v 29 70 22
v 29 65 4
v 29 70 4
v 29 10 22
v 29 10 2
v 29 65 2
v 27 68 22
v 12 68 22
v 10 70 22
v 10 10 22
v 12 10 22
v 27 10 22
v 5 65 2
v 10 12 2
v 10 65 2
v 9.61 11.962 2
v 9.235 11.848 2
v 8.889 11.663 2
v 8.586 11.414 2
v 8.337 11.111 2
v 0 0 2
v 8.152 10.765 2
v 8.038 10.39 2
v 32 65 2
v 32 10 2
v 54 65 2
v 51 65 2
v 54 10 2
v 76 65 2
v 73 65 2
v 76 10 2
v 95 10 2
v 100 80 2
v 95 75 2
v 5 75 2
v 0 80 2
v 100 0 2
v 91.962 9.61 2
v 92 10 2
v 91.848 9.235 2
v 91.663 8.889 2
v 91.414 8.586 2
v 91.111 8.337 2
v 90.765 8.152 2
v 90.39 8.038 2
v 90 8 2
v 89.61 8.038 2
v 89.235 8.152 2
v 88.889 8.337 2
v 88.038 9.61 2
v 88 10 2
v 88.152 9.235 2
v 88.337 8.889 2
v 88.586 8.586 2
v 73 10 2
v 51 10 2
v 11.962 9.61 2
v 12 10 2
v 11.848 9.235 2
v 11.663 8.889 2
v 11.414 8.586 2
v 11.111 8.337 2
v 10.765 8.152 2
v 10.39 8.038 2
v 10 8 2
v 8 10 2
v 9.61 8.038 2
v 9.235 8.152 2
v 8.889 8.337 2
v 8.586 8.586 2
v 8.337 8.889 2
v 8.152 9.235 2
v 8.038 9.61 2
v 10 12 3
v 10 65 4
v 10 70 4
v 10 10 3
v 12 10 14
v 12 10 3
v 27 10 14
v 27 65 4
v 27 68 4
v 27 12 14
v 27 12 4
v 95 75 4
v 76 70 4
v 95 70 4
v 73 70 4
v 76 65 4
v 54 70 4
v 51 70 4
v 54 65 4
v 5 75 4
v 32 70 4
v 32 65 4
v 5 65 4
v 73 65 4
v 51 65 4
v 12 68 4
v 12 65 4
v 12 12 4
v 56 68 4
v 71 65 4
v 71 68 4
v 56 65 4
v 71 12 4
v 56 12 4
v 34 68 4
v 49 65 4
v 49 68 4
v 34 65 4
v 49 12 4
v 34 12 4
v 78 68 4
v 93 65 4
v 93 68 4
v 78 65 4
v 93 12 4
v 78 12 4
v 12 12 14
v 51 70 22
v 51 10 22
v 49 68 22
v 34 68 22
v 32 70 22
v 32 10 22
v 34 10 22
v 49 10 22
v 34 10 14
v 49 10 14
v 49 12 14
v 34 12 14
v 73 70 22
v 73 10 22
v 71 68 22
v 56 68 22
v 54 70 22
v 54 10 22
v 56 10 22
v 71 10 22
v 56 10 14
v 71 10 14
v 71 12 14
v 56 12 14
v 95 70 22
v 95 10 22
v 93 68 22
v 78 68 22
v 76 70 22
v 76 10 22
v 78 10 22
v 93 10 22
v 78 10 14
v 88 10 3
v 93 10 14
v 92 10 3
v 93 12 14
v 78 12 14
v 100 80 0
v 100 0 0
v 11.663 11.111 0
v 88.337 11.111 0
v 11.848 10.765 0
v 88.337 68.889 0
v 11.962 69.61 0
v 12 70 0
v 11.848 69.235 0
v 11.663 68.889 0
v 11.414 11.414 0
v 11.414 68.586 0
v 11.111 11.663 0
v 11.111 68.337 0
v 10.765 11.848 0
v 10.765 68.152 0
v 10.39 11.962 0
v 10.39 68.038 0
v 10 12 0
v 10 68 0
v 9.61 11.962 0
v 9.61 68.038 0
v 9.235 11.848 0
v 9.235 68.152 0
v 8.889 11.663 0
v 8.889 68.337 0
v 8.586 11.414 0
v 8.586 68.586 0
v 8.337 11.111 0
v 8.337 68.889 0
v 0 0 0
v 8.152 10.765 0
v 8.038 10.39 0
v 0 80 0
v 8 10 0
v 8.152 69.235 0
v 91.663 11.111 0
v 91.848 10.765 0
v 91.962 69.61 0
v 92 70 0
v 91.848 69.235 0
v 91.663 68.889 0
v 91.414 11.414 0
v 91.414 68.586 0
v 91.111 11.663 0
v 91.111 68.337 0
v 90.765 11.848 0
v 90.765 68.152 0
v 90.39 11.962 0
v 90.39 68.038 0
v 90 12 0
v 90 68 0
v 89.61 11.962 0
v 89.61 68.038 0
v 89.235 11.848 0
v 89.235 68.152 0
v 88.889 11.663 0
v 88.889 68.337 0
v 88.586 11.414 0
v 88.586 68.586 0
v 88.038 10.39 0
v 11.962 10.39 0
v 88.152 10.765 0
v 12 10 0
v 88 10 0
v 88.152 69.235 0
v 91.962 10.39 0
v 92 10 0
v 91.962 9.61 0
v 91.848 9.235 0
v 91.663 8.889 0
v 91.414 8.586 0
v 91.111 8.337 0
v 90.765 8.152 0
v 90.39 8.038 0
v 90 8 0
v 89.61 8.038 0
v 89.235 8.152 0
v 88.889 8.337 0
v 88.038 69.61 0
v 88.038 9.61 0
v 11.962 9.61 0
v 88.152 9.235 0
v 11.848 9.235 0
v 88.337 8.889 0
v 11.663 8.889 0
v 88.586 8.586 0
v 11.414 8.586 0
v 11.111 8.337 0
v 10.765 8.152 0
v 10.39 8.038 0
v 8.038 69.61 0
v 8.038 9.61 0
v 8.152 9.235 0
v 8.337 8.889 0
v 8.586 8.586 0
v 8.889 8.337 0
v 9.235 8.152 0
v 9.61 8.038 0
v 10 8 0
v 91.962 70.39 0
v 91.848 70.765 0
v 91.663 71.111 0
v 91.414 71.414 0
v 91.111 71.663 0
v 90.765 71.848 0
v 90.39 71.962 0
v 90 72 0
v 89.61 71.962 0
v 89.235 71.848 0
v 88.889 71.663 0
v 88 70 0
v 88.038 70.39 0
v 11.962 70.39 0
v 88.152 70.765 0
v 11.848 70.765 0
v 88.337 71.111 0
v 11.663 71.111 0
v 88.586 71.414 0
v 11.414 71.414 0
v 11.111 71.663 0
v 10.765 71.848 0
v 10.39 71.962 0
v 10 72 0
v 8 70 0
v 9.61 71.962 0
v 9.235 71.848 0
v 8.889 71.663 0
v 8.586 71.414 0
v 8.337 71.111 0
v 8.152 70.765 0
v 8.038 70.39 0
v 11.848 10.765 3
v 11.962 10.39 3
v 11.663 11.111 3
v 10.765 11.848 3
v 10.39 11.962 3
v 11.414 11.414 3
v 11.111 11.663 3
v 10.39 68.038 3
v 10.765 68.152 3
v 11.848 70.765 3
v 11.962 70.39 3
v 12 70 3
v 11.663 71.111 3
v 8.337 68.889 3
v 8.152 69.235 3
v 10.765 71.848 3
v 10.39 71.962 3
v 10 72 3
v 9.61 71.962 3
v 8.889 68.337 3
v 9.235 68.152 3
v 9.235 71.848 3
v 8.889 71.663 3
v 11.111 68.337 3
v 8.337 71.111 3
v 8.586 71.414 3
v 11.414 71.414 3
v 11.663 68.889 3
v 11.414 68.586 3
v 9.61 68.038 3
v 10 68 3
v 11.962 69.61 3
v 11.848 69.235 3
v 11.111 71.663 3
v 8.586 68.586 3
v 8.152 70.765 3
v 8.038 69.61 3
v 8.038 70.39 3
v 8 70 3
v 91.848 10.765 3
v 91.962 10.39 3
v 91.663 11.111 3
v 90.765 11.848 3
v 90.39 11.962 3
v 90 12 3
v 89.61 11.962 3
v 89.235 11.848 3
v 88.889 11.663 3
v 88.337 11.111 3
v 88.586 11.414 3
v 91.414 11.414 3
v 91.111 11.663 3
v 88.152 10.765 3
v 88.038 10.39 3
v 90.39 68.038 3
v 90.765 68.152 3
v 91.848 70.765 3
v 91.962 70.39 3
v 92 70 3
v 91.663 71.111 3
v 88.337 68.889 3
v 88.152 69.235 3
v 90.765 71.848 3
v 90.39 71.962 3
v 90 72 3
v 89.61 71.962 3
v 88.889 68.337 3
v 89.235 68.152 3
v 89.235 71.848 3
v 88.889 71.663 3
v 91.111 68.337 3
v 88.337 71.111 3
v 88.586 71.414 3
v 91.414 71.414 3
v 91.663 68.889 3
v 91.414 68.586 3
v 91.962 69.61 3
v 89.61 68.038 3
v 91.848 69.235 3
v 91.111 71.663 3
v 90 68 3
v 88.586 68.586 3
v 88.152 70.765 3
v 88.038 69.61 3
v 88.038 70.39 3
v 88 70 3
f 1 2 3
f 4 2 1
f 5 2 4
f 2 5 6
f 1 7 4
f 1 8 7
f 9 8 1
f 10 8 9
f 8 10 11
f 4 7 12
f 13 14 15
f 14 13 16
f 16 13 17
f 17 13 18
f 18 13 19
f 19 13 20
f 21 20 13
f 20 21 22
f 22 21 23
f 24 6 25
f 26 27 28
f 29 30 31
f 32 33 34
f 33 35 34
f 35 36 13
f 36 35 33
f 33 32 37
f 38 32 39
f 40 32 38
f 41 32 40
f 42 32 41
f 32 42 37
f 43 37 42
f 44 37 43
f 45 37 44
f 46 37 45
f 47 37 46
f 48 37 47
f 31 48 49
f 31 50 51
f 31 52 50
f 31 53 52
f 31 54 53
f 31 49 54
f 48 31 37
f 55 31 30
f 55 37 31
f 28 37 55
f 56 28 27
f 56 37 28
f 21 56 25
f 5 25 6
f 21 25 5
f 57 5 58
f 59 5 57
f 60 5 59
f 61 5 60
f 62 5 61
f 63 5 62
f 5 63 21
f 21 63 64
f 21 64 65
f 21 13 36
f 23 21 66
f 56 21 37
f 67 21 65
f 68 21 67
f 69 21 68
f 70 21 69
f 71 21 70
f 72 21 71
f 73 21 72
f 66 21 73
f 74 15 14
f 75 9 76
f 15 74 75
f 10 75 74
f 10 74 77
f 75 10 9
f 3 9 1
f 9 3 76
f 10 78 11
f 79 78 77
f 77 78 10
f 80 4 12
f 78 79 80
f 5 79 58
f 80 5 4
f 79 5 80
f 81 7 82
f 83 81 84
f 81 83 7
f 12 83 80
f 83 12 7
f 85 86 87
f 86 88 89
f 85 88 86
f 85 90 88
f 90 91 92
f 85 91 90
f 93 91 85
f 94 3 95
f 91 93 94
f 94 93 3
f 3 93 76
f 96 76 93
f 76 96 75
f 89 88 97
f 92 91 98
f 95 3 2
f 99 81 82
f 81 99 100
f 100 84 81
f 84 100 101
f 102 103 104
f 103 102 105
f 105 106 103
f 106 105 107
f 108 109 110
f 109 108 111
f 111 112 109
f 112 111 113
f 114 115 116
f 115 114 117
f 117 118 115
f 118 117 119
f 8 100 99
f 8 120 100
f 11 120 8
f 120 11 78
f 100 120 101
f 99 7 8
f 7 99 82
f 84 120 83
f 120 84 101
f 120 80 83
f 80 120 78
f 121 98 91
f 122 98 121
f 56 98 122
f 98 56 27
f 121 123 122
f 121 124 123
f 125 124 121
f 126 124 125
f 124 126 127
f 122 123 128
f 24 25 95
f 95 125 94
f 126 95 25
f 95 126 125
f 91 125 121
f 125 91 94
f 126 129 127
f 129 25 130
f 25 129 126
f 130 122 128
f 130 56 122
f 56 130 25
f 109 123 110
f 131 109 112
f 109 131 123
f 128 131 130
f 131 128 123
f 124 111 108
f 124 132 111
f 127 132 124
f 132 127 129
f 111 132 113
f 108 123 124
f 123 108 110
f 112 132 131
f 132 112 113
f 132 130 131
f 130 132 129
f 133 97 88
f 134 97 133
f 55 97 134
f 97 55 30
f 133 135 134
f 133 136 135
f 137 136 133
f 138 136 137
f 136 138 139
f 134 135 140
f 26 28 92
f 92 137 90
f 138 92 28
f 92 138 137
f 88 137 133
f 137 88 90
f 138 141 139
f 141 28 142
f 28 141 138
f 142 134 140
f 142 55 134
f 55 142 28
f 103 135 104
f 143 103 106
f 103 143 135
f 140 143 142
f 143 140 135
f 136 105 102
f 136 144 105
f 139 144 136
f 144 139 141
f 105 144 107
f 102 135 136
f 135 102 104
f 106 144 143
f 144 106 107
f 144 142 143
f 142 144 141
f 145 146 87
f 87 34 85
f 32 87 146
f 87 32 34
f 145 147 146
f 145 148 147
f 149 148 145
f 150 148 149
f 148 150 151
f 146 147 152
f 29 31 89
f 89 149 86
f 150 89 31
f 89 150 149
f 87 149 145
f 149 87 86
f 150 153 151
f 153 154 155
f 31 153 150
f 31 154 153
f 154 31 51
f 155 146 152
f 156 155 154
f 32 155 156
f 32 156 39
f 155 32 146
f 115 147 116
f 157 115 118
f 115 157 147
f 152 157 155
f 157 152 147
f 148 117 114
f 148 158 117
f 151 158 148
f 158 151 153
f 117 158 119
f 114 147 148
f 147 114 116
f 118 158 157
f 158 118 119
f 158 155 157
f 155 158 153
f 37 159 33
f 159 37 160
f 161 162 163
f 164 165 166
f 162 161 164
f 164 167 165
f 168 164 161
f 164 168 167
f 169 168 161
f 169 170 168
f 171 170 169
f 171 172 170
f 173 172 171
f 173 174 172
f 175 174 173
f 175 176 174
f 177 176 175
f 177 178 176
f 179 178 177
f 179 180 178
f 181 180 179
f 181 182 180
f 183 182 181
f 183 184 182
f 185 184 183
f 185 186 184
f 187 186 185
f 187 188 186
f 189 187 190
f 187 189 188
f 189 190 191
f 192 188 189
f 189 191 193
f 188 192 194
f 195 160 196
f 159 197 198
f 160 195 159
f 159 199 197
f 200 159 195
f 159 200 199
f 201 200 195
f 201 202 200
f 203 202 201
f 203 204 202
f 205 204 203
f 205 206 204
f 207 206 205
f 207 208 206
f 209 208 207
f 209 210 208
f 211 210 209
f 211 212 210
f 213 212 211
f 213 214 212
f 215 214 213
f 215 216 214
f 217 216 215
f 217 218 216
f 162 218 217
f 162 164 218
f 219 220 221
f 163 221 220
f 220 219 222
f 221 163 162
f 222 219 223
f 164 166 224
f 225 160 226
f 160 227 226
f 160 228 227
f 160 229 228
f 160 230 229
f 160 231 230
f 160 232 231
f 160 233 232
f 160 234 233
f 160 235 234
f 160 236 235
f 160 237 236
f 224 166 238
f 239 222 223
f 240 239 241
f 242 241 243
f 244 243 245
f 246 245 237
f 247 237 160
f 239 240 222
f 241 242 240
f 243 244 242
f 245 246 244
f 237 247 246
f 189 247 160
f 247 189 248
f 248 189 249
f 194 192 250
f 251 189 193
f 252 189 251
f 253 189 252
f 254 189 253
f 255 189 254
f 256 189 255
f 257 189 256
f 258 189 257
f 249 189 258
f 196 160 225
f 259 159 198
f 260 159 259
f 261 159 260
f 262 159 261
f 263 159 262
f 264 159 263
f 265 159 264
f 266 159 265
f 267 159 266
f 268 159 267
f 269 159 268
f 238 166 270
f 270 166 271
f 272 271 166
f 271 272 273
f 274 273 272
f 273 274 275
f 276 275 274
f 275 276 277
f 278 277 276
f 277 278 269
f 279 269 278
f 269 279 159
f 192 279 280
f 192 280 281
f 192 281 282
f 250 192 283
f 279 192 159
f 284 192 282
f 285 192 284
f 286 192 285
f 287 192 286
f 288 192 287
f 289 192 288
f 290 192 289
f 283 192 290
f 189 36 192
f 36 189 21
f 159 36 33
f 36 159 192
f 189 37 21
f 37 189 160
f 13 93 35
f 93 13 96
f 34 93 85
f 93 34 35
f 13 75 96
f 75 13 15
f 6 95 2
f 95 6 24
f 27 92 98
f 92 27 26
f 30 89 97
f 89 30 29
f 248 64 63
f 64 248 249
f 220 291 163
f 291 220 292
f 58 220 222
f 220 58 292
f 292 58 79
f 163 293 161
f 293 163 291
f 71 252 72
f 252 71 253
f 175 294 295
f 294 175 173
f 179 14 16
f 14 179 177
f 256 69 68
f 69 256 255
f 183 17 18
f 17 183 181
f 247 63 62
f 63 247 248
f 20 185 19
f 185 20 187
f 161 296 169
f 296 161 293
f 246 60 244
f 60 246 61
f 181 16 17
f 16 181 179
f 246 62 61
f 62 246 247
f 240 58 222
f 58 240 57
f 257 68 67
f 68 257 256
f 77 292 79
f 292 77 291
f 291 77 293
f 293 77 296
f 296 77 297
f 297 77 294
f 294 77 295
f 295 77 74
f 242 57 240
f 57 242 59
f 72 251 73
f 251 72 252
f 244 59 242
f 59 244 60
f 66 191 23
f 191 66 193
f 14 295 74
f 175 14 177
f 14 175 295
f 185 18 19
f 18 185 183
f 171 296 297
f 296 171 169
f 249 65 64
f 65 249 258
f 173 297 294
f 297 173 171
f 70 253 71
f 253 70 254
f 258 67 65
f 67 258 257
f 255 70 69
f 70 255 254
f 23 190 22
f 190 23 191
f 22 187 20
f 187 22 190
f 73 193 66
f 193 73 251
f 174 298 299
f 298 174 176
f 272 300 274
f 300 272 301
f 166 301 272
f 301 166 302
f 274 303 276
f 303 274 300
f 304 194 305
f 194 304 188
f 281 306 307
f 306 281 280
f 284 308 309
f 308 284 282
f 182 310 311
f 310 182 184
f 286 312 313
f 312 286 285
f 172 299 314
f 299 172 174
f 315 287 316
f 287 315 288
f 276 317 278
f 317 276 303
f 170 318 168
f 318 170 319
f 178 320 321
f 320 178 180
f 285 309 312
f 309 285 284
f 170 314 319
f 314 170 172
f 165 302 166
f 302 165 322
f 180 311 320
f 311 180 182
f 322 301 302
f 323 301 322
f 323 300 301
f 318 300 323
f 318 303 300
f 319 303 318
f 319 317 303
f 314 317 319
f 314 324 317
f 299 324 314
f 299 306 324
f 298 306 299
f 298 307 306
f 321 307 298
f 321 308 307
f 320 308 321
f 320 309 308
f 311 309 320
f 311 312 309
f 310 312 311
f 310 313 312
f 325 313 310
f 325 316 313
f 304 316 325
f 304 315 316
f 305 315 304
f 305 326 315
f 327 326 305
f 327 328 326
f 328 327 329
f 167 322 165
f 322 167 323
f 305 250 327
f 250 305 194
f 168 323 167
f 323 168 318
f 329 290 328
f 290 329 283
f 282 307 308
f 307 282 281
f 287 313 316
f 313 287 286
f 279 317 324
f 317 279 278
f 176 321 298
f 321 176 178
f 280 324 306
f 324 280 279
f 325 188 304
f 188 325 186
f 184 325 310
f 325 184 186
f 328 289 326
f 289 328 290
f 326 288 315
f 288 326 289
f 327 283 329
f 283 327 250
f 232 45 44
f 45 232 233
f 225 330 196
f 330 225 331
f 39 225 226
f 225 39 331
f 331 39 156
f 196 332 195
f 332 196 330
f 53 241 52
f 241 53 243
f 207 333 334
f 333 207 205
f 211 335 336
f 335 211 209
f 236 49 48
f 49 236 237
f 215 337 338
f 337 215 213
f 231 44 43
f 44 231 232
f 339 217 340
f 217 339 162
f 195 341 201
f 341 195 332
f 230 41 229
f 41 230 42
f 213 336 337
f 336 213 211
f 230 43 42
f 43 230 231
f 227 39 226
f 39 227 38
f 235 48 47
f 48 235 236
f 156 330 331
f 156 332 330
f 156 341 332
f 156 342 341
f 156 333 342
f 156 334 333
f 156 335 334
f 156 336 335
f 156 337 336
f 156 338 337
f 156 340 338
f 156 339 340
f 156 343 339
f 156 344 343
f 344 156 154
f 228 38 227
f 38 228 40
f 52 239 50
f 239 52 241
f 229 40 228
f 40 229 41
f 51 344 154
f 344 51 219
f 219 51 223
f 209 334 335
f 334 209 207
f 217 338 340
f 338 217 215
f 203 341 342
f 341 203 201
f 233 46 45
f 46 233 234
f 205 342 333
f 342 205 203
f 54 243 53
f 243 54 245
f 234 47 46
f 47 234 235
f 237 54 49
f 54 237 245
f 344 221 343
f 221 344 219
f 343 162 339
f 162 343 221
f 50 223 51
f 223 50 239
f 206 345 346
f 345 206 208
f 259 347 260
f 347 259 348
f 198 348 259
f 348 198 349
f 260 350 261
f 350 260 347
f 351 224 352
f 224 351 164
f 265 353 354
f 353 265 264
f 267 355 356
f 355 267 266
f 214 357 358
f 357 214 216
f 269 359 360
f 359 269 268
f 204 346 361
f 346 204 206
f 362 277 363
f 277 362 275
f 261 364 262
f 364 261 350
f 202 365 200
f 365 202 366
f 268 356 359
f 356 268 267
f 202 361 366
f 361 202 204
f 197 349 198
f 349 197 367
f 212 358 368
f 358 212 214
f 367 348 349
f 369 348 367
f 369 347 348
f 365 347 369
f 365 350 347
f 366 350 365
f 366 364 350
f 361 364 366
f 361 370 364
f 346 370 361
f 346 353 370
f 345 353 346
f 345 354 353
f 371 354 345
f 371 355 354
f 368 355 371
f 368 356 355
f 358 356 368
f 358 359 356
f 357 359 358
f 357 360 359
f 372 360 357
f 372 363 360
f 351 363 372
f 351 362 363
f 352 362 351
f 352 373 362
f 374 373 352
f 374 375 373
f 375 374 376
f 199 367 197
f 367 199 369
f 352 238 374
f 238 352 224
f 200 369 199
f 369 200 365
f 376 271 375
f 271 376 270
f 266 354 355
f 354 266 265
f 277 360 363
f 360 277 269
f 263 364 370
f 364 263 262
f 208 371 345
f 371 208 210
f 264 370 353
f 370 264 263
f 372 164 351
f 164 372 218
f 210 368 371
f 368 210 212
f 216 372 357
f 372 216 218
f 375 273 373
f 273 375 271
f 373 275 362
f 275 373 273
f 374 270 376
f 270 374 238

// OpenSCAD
// Cable Organizer for Desk or Rack Mount
// Helps keep development cables organized and labeled

// Parameters
wall_thickness = 2;
base_width = 80;
base_length = 100;
base_height = 2;
channel_width = 15;
channel_height = 20;
num_channels = 4;
mounting_hole_diameter = 4;

// Main module
module cable_organizer() {
    difference() {
        union() {
            // Base plate
            cube([base_length, base_width, base_height]);
            
            // Channels for cables
            for (i = [0:num_channels-1]) {
                translate([10 + i * 22, 10, base_height]) {
                    difference() {
                        // Outer channel
                        cube([channel_width + wall_thickness * 2, 
                              base_width - 20, 
                              channel_height]);
                        
                        // Inner channel cutout
                        translate([wall_thickness, wall_thickness, wall_thickness]) {
                            cube([channel_width, 
                                  base_width - 20 - wall_thickness * 2, 
                                  channel_height]);
                        }
                        
                        // Front opening (entrance for cables)
                        translate([wall_thickness, 0, channel_height - 8]) {
                            cube([channel_width, wall_thickness + 1, 10]);
                        }
                    }
                }
            }
            
            // Label area
            translate([5, base_width - 15, base_height]) {
                cube([base_length - 10, 10, 2]);
            }
        }
        
        // Mounting holes
        for (x = [10, base_length - 10]) {
            for (y = [10, base_width - 10]) {
                translate([x, y, -1]) {
                    cylinder(h = base_height + 2, d = mounting_hole_diameter, $fn = 32);
                }
            }
        }
    }
}

// Render the cable organizer
cable_organizer();
